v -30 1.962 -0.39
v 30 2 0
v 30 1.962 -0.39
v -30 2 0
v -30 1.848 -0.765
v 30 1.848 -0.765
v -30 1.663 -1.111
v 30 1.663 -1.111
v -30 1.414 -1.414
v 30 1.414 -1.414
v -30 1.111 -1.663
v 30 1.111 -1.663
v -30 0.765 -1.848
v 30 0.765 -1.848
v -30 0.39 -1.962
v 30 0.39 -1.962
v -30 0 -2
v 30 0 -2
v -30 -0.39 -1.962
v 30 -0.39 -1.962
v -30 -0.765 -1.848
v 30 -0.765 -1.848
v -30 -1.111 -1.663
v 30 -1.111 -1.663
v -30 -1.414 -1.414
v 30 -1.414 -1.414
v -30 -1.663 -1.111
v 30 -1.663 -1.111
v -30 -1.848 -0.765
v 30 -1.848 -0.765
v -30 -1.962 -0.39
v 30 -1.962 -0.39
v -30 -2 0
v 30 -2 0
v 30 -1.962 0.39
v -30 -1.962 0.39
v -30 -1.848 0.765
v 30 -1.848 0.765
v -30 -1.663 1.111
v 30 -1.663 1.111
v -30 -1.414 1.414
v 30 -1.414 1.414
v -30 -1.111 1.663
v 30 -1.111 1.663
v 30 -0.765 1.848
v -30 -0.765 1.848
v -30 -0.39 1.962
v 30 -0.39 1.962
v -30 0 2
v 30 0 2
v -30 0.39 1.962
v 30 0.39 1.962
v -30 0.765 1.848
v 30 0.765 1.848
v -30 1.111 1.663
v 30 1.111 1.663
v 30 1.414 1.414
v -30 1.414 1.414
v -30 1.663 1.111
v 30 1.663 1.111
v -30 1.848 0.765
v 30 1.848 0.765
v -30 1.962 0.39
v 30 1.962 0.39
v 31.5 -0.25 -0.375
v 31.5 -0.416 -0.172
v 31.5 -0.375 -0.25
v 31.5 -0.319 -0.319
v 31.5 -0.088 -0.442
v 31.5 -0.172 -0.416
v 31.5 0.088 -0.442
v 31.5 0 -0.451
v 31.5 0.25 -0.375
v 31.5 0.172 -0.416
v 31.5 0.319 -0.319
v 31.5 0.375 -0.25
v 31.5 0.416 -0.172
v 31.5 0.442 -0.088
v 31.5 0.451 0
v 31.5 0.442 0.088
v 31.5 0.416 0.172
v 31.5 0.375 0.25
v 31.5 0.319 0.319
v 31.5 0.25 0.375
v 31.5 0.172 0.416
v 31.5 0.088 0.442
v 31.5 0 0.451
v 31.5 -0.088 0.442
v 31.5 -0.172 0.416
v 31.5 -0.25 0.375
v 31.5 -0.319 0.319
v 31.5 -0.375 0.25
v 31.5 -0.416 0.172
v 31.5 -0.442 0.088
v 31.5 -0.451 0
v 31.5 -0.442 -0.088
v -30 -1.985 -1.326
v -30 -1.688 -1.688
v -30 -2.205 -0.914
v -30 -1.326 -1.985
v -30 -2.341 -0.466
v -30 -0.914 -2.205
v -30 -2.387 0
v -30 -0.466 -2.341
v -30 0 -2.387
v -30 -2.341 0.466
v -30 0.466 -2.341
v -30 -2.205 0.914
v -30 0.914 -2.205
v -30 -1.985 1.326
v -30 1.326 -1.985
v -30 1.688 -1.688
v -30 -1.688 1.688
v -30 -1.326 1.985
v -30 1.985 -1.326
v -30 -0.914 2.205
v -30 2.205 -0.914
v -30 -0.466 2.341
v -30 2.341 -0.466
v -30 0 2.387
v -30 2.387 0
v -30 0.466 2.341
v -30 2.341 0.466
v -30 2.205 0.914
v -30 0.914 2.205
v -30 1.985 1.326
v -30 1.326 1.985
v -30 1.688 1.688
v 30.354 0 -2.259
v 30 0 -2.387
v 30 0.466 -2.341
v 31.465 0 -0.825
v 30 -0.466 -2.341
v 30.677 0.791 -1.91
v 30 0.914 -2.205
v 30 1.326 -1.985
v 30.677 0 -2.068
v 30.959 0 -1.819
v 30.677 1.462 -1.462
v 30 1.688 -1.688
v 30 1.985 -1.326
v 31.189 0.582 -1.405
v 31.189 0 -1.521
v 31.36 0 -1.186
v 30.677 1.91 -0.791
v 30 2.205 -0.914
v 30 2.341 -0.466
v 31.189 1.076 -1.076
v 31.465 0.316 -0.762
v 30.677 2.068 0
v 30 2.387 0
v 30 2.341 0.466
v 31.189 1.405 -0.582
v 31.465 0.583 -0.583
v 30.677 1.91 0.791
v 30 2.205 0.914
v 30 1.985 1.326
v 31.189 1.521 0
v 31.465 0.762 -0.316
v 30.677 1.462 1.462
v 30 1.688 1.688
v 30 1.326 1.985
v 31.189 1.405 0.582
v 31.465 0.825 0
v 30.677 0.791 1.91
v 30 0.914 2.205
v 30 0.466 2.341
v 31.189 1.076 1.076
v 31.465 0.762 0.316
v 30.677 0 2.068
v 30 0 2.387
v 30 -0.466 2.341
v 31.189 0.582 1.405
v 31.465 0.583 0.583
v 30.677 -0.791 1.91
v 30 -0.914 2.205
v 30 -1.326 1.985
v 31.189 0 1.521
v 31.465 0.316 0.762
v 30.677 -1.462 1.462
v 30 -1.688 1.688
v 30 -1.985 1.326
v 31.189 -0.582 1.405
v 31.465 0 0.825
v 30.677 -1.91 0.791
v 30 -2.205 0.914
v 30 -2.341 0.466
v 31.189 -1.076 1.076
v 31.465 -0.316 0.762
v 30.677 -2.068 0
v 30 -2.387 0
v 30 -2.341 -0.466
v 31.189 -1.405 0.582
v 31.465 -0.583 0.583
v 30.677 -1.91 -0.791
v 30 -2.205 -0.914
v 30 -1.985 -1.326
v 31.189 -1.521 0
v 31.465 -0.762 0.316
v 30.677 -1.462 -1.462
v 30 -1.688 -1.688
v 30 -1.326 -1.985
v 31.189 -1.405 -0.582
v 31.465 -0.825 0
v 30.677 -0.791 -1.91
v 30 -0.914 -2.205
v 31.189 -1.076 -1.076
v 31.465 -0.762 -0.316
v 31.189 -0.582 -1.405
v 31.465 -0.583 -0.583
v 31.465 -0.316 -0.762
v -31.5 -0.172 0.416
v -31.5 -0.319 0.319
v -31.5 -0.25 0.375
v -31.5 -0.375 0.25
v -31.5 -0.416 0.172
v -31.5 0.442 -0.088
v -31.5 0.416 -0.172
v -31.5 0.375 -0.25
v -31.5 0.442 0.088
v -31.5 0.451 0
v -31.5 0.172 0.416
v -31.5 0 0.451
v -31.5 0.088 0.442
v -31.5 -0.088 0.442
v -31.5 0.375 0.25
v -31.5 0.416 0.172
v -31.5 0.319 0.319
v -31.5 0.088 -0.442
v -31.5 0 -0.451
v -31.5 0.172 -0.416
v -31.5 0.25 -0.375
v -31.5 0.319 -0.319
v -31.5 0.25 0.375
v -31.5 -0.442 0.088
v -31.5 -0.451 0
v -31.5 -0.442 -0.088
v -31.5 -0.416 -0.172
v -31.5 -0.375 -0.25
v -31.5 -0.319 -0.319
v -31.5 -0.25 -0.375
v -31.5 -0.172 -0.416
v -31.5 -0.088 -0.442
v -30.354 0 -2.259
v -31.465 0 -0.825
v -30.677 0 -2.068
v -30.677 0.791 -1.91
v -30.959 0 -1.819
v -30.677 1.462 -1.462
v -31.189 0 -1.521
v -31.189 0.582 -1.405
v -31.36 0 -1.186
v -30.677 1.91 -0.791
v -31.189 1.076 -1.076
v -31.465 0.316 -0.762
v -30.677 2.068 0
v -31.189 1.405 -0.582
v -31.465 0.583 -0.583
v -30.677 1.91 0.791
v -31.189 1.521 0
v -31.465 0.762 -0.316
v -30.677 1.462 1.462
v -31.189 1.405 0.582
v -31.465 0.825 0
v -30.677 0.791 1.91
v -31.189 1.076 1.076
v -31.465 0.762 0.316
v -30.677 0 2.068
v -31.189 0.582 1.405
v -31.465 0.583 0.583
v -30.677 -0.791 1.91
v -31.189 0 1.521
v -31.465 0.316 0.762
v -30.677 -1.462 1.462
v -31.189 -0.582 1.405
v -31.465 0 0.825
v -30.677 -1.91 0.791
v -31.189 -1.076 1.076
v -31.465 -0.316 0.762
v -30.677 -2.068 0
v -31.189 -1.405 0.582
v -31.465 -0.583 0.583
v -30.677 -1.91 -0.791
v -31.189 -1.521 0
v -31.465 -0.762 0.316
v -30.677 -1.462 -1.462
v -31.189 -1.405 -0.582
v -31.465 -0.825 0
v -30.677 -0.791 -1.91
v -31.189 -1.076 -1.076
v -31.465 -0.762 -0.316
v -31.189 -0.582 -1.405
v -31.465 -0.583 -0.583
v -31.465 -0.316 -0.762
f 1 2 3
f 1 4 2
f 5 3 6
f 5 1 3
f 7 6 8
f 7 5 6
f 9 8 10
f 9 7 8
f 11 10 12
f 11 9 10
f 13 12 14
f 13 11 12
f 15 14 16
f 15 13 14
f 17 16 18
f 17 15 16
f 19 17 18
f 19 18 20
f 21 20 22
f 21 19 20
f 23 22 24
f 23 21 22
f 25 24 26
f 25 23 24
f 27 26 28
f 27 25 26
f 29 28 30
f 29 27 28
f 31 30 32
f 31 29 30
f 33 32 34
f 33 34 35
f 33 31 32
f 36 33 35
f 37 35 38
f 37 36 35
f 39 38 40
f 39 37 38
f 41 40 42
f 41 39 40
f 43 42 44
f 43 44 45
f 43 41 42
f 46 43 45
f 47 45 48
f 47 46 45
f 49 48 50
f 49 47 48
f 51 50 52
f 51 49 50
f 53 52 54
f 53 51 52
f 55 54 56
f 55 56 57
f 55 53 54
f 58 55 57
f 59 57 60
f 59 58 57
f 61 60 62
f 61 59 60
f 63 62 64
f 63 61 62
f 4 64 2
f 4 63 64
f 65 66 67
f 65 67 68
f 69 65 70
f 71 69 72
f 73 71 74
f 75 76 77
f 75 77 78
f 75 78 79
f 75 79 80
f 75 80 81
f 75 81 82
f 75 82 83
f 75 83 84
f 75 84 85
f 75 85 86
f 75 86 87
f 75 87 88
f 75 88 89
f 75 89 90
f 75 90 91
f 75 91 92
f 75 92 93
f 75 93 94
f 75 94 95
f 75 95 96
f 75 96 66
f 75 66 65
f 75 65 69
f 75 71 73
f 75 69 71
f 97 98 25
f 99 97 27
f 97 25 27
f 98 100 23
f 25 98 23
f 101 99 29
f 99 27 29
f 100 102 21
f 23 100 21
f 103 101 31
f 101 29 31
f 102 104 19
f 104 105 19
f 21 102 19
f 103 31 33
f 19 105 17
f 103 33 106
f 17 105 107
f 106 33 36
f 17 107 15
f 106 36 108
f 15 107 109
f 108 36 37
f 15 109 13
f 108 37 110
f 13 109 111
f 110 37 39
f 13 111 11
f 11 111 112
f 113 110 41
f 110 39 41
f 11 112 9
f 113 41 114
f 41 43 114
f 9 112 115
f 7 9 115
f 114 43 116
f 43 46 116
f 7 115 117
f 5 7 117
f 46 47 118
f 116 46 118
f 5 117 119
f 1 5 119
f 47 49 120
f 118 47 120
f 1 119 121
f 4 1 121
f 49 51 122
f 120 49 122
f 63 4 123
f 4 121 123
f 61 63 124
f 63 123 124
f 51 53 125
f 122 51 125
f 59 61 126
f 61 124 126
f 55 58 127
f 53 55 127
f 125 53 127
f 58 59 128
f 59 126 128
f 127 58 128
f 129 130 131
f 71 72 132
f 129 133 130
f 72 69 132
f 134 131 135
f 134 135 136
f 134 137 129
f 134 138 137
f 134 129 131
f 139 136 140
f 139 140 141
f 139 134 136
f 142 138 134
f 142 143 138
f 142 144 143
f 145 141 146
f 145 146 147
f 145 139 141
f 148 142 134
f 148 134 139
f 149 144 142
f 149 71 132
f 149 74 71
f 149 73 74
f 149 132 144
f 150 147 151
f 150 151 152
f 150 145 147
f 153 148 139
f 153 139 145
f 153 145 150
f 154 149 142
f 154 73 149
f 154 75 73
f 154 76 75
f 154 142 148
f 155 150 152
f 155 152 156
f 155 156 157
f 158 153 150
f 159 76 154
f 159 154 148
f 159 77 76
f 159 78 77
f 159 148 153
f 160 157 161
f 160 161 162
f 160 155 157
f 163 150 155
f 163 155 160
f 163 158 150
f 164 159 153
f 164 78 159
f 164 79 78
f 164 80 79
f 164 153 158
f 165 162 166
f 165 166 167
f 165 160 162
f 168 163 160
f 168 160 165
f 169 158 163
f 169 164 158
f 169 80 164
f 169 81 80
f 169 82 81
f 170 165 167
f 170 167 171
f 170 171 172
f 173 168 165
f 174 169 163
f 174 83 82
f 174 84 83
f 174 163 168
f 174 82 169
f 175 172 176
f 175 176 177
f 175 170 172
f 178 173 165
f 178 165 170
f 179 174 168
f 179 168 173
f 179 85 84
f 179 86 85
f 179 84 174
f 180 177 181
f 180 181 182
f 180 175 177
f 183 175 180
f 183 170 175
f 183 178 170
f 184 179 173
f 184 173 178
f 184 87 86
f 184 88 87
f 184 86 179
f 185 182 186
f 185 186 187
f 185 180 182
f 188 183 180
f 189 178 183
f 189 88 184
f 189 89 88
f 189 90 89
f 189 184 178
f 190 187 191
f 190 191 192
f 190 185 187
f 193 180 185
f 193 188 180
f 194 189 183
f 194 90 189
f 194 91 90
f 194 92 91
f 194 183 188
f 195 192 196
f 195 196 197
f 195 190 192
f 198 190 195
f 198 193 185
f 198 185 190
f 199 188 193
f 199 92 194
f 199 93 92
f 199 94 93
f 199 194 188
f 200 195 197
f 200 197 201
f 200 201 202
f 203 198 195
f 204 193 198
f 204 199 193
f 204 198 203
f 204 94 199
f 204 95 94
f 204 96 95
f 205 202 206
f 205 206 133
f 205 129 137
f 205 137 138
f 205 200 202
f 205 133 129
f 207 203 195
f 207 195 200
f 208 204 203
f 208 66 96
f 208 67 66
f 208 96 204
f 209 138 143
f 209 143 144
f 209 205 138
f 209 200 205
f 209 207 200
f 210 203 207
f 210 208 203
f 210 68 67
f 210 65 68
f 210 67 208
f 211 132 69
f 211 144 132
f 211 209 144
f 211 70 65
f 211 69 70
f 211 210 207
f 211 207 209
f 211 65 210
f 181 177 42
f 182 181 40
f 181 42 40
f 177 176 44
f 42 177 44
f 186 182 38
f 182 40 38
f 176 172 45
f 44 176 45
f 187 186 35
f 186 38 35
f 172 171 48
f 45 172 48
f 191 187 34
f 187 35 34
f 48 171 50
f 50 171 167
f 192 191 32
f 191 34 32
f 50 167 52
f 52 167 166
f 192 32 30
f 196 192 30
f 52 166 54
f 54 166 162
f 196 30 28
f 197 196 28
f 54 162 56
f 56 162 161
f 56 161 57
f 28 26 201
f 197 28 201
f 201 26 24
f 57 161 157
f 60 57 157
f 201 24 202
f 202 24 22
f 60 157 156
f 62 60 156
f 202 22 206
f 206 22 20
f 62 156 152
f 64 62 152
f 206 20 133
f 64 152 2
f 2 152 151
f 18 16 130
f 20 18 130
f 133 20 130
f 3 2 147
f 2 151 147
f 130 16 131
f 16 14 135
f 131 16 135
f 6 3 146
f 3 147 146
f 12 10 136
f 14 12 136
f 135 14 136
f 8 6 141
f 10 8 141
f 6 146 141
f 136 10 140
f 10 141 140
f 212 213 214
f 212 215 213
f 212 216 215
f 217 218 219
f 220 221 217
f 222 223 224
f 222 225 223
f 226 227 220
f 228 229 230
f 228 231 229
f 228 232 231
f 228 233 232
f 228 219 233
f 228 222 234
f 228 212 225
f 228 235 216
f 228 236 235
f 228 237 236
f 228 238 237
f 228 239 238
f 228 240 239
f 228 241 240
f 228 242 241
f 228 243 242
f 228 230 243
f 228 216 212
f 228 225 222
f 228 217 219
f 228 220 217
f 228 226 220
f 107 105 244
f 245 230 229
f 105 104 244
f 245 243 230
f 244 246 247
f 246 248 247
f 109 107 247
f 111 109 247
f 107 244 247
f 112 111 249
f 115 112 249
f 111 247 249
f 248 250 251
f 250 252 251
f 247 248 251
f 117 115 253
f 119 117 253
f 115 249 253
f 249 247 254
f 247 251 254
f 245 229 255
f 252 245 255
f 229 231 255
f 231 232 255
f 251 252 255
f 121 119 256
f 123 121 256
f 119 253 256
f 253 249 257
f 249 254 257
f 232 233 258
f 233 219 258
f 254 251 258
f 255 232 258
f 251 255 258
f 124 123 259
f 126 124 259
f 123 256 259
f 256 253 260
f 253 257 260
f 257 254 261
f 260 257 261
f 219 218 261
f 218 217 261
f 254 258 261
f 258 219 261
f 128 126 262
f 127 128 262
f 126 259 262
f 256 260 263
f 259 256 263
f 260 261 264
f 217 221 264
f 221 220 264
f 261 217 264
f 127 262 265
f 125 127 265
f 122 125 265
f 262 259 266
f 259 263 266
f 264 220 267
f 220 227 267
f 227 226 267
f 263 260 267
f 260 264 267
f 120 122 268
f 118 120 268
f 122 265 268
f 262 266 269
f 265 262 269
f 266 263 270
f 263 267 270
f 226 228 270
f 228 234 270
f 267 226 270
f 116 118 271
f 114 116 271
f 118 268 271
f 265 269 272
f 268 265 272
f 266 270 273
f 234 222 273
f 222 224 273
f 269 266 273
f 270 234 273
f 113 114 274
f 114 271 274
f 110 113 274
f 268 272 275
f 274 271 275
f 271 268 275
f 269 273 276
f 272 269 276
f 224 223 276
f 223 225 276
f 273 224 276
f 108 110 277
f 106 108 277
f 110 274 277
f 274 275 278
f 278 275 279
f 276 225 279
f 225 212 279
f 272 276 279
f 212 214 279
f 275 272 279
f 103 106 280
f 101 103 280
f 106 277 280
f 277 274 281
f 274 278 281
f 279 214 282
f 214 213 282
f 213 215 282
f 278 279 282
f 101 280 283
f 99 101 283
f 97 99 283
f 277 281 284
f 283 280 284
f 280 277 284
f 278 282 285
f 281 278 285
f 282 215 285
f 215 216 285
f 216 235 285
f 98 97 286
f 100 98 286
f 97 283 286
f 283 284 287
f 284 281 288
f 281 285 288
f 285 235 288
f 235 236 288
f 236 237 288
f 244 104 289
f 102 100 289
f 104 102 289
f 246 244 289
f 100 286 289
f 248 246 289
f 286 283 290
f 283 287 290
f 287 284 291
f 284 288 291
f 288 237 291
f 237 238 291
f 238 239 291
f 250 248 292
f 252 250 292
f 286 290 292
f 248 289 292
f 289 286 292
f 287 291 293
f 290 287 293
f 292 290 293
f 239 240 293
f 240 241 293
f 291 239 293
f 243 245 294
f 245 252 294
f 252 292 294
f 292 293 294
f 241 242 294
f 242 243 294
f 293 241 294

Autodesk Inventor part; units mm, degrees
ref_plane "YZ Plane" through (0, 0, 0) normal (1, 0, 0) x (0, 1, 0)
ref_plane "XZ Plane" through (0, 0, 0) normal (0, 1, 0) x (-1, 0, 0)
ref_plane "XY Plane" through (0, 0, 0) normal (0, 0, 1) x (1, 0, 0)
sketch "Sketch1" plane through (0, 0, 0) normal (1, 0, 0) x (0, 1, 0)
  circle A0 centre (0, 0) radius 2
  circle A1 centre (0, 0) radius 2.2361
  dimension "d0" = 4
extrude "Extrusion1" add sketch "Sketch1" along normal mid plane 63 contours A0
sketch "Sketch2" plane through (31.5, 0, 0) normal (1, 0, 0) x (0, 0, -1)
  circle A0 centre (0, 0) radius 2.3871
extrude "Extrusion2" add sketch "Sketch2" against normal blind 1.5
fillet "Fillet1" radius 2 1 edges at (31.5, 0, 2.3871)
mirror "Mirror1" about plane through (0, 0, 0) normal (1, 0, 0) of "Extrusion2", "Fillet1"
ref_plane "Work Plane1" through (0, 0, 0) normal (1, 0, 0) x (0, 1, 0)
properties part number "clampScrewHandle" material "Steel, Alloy"
